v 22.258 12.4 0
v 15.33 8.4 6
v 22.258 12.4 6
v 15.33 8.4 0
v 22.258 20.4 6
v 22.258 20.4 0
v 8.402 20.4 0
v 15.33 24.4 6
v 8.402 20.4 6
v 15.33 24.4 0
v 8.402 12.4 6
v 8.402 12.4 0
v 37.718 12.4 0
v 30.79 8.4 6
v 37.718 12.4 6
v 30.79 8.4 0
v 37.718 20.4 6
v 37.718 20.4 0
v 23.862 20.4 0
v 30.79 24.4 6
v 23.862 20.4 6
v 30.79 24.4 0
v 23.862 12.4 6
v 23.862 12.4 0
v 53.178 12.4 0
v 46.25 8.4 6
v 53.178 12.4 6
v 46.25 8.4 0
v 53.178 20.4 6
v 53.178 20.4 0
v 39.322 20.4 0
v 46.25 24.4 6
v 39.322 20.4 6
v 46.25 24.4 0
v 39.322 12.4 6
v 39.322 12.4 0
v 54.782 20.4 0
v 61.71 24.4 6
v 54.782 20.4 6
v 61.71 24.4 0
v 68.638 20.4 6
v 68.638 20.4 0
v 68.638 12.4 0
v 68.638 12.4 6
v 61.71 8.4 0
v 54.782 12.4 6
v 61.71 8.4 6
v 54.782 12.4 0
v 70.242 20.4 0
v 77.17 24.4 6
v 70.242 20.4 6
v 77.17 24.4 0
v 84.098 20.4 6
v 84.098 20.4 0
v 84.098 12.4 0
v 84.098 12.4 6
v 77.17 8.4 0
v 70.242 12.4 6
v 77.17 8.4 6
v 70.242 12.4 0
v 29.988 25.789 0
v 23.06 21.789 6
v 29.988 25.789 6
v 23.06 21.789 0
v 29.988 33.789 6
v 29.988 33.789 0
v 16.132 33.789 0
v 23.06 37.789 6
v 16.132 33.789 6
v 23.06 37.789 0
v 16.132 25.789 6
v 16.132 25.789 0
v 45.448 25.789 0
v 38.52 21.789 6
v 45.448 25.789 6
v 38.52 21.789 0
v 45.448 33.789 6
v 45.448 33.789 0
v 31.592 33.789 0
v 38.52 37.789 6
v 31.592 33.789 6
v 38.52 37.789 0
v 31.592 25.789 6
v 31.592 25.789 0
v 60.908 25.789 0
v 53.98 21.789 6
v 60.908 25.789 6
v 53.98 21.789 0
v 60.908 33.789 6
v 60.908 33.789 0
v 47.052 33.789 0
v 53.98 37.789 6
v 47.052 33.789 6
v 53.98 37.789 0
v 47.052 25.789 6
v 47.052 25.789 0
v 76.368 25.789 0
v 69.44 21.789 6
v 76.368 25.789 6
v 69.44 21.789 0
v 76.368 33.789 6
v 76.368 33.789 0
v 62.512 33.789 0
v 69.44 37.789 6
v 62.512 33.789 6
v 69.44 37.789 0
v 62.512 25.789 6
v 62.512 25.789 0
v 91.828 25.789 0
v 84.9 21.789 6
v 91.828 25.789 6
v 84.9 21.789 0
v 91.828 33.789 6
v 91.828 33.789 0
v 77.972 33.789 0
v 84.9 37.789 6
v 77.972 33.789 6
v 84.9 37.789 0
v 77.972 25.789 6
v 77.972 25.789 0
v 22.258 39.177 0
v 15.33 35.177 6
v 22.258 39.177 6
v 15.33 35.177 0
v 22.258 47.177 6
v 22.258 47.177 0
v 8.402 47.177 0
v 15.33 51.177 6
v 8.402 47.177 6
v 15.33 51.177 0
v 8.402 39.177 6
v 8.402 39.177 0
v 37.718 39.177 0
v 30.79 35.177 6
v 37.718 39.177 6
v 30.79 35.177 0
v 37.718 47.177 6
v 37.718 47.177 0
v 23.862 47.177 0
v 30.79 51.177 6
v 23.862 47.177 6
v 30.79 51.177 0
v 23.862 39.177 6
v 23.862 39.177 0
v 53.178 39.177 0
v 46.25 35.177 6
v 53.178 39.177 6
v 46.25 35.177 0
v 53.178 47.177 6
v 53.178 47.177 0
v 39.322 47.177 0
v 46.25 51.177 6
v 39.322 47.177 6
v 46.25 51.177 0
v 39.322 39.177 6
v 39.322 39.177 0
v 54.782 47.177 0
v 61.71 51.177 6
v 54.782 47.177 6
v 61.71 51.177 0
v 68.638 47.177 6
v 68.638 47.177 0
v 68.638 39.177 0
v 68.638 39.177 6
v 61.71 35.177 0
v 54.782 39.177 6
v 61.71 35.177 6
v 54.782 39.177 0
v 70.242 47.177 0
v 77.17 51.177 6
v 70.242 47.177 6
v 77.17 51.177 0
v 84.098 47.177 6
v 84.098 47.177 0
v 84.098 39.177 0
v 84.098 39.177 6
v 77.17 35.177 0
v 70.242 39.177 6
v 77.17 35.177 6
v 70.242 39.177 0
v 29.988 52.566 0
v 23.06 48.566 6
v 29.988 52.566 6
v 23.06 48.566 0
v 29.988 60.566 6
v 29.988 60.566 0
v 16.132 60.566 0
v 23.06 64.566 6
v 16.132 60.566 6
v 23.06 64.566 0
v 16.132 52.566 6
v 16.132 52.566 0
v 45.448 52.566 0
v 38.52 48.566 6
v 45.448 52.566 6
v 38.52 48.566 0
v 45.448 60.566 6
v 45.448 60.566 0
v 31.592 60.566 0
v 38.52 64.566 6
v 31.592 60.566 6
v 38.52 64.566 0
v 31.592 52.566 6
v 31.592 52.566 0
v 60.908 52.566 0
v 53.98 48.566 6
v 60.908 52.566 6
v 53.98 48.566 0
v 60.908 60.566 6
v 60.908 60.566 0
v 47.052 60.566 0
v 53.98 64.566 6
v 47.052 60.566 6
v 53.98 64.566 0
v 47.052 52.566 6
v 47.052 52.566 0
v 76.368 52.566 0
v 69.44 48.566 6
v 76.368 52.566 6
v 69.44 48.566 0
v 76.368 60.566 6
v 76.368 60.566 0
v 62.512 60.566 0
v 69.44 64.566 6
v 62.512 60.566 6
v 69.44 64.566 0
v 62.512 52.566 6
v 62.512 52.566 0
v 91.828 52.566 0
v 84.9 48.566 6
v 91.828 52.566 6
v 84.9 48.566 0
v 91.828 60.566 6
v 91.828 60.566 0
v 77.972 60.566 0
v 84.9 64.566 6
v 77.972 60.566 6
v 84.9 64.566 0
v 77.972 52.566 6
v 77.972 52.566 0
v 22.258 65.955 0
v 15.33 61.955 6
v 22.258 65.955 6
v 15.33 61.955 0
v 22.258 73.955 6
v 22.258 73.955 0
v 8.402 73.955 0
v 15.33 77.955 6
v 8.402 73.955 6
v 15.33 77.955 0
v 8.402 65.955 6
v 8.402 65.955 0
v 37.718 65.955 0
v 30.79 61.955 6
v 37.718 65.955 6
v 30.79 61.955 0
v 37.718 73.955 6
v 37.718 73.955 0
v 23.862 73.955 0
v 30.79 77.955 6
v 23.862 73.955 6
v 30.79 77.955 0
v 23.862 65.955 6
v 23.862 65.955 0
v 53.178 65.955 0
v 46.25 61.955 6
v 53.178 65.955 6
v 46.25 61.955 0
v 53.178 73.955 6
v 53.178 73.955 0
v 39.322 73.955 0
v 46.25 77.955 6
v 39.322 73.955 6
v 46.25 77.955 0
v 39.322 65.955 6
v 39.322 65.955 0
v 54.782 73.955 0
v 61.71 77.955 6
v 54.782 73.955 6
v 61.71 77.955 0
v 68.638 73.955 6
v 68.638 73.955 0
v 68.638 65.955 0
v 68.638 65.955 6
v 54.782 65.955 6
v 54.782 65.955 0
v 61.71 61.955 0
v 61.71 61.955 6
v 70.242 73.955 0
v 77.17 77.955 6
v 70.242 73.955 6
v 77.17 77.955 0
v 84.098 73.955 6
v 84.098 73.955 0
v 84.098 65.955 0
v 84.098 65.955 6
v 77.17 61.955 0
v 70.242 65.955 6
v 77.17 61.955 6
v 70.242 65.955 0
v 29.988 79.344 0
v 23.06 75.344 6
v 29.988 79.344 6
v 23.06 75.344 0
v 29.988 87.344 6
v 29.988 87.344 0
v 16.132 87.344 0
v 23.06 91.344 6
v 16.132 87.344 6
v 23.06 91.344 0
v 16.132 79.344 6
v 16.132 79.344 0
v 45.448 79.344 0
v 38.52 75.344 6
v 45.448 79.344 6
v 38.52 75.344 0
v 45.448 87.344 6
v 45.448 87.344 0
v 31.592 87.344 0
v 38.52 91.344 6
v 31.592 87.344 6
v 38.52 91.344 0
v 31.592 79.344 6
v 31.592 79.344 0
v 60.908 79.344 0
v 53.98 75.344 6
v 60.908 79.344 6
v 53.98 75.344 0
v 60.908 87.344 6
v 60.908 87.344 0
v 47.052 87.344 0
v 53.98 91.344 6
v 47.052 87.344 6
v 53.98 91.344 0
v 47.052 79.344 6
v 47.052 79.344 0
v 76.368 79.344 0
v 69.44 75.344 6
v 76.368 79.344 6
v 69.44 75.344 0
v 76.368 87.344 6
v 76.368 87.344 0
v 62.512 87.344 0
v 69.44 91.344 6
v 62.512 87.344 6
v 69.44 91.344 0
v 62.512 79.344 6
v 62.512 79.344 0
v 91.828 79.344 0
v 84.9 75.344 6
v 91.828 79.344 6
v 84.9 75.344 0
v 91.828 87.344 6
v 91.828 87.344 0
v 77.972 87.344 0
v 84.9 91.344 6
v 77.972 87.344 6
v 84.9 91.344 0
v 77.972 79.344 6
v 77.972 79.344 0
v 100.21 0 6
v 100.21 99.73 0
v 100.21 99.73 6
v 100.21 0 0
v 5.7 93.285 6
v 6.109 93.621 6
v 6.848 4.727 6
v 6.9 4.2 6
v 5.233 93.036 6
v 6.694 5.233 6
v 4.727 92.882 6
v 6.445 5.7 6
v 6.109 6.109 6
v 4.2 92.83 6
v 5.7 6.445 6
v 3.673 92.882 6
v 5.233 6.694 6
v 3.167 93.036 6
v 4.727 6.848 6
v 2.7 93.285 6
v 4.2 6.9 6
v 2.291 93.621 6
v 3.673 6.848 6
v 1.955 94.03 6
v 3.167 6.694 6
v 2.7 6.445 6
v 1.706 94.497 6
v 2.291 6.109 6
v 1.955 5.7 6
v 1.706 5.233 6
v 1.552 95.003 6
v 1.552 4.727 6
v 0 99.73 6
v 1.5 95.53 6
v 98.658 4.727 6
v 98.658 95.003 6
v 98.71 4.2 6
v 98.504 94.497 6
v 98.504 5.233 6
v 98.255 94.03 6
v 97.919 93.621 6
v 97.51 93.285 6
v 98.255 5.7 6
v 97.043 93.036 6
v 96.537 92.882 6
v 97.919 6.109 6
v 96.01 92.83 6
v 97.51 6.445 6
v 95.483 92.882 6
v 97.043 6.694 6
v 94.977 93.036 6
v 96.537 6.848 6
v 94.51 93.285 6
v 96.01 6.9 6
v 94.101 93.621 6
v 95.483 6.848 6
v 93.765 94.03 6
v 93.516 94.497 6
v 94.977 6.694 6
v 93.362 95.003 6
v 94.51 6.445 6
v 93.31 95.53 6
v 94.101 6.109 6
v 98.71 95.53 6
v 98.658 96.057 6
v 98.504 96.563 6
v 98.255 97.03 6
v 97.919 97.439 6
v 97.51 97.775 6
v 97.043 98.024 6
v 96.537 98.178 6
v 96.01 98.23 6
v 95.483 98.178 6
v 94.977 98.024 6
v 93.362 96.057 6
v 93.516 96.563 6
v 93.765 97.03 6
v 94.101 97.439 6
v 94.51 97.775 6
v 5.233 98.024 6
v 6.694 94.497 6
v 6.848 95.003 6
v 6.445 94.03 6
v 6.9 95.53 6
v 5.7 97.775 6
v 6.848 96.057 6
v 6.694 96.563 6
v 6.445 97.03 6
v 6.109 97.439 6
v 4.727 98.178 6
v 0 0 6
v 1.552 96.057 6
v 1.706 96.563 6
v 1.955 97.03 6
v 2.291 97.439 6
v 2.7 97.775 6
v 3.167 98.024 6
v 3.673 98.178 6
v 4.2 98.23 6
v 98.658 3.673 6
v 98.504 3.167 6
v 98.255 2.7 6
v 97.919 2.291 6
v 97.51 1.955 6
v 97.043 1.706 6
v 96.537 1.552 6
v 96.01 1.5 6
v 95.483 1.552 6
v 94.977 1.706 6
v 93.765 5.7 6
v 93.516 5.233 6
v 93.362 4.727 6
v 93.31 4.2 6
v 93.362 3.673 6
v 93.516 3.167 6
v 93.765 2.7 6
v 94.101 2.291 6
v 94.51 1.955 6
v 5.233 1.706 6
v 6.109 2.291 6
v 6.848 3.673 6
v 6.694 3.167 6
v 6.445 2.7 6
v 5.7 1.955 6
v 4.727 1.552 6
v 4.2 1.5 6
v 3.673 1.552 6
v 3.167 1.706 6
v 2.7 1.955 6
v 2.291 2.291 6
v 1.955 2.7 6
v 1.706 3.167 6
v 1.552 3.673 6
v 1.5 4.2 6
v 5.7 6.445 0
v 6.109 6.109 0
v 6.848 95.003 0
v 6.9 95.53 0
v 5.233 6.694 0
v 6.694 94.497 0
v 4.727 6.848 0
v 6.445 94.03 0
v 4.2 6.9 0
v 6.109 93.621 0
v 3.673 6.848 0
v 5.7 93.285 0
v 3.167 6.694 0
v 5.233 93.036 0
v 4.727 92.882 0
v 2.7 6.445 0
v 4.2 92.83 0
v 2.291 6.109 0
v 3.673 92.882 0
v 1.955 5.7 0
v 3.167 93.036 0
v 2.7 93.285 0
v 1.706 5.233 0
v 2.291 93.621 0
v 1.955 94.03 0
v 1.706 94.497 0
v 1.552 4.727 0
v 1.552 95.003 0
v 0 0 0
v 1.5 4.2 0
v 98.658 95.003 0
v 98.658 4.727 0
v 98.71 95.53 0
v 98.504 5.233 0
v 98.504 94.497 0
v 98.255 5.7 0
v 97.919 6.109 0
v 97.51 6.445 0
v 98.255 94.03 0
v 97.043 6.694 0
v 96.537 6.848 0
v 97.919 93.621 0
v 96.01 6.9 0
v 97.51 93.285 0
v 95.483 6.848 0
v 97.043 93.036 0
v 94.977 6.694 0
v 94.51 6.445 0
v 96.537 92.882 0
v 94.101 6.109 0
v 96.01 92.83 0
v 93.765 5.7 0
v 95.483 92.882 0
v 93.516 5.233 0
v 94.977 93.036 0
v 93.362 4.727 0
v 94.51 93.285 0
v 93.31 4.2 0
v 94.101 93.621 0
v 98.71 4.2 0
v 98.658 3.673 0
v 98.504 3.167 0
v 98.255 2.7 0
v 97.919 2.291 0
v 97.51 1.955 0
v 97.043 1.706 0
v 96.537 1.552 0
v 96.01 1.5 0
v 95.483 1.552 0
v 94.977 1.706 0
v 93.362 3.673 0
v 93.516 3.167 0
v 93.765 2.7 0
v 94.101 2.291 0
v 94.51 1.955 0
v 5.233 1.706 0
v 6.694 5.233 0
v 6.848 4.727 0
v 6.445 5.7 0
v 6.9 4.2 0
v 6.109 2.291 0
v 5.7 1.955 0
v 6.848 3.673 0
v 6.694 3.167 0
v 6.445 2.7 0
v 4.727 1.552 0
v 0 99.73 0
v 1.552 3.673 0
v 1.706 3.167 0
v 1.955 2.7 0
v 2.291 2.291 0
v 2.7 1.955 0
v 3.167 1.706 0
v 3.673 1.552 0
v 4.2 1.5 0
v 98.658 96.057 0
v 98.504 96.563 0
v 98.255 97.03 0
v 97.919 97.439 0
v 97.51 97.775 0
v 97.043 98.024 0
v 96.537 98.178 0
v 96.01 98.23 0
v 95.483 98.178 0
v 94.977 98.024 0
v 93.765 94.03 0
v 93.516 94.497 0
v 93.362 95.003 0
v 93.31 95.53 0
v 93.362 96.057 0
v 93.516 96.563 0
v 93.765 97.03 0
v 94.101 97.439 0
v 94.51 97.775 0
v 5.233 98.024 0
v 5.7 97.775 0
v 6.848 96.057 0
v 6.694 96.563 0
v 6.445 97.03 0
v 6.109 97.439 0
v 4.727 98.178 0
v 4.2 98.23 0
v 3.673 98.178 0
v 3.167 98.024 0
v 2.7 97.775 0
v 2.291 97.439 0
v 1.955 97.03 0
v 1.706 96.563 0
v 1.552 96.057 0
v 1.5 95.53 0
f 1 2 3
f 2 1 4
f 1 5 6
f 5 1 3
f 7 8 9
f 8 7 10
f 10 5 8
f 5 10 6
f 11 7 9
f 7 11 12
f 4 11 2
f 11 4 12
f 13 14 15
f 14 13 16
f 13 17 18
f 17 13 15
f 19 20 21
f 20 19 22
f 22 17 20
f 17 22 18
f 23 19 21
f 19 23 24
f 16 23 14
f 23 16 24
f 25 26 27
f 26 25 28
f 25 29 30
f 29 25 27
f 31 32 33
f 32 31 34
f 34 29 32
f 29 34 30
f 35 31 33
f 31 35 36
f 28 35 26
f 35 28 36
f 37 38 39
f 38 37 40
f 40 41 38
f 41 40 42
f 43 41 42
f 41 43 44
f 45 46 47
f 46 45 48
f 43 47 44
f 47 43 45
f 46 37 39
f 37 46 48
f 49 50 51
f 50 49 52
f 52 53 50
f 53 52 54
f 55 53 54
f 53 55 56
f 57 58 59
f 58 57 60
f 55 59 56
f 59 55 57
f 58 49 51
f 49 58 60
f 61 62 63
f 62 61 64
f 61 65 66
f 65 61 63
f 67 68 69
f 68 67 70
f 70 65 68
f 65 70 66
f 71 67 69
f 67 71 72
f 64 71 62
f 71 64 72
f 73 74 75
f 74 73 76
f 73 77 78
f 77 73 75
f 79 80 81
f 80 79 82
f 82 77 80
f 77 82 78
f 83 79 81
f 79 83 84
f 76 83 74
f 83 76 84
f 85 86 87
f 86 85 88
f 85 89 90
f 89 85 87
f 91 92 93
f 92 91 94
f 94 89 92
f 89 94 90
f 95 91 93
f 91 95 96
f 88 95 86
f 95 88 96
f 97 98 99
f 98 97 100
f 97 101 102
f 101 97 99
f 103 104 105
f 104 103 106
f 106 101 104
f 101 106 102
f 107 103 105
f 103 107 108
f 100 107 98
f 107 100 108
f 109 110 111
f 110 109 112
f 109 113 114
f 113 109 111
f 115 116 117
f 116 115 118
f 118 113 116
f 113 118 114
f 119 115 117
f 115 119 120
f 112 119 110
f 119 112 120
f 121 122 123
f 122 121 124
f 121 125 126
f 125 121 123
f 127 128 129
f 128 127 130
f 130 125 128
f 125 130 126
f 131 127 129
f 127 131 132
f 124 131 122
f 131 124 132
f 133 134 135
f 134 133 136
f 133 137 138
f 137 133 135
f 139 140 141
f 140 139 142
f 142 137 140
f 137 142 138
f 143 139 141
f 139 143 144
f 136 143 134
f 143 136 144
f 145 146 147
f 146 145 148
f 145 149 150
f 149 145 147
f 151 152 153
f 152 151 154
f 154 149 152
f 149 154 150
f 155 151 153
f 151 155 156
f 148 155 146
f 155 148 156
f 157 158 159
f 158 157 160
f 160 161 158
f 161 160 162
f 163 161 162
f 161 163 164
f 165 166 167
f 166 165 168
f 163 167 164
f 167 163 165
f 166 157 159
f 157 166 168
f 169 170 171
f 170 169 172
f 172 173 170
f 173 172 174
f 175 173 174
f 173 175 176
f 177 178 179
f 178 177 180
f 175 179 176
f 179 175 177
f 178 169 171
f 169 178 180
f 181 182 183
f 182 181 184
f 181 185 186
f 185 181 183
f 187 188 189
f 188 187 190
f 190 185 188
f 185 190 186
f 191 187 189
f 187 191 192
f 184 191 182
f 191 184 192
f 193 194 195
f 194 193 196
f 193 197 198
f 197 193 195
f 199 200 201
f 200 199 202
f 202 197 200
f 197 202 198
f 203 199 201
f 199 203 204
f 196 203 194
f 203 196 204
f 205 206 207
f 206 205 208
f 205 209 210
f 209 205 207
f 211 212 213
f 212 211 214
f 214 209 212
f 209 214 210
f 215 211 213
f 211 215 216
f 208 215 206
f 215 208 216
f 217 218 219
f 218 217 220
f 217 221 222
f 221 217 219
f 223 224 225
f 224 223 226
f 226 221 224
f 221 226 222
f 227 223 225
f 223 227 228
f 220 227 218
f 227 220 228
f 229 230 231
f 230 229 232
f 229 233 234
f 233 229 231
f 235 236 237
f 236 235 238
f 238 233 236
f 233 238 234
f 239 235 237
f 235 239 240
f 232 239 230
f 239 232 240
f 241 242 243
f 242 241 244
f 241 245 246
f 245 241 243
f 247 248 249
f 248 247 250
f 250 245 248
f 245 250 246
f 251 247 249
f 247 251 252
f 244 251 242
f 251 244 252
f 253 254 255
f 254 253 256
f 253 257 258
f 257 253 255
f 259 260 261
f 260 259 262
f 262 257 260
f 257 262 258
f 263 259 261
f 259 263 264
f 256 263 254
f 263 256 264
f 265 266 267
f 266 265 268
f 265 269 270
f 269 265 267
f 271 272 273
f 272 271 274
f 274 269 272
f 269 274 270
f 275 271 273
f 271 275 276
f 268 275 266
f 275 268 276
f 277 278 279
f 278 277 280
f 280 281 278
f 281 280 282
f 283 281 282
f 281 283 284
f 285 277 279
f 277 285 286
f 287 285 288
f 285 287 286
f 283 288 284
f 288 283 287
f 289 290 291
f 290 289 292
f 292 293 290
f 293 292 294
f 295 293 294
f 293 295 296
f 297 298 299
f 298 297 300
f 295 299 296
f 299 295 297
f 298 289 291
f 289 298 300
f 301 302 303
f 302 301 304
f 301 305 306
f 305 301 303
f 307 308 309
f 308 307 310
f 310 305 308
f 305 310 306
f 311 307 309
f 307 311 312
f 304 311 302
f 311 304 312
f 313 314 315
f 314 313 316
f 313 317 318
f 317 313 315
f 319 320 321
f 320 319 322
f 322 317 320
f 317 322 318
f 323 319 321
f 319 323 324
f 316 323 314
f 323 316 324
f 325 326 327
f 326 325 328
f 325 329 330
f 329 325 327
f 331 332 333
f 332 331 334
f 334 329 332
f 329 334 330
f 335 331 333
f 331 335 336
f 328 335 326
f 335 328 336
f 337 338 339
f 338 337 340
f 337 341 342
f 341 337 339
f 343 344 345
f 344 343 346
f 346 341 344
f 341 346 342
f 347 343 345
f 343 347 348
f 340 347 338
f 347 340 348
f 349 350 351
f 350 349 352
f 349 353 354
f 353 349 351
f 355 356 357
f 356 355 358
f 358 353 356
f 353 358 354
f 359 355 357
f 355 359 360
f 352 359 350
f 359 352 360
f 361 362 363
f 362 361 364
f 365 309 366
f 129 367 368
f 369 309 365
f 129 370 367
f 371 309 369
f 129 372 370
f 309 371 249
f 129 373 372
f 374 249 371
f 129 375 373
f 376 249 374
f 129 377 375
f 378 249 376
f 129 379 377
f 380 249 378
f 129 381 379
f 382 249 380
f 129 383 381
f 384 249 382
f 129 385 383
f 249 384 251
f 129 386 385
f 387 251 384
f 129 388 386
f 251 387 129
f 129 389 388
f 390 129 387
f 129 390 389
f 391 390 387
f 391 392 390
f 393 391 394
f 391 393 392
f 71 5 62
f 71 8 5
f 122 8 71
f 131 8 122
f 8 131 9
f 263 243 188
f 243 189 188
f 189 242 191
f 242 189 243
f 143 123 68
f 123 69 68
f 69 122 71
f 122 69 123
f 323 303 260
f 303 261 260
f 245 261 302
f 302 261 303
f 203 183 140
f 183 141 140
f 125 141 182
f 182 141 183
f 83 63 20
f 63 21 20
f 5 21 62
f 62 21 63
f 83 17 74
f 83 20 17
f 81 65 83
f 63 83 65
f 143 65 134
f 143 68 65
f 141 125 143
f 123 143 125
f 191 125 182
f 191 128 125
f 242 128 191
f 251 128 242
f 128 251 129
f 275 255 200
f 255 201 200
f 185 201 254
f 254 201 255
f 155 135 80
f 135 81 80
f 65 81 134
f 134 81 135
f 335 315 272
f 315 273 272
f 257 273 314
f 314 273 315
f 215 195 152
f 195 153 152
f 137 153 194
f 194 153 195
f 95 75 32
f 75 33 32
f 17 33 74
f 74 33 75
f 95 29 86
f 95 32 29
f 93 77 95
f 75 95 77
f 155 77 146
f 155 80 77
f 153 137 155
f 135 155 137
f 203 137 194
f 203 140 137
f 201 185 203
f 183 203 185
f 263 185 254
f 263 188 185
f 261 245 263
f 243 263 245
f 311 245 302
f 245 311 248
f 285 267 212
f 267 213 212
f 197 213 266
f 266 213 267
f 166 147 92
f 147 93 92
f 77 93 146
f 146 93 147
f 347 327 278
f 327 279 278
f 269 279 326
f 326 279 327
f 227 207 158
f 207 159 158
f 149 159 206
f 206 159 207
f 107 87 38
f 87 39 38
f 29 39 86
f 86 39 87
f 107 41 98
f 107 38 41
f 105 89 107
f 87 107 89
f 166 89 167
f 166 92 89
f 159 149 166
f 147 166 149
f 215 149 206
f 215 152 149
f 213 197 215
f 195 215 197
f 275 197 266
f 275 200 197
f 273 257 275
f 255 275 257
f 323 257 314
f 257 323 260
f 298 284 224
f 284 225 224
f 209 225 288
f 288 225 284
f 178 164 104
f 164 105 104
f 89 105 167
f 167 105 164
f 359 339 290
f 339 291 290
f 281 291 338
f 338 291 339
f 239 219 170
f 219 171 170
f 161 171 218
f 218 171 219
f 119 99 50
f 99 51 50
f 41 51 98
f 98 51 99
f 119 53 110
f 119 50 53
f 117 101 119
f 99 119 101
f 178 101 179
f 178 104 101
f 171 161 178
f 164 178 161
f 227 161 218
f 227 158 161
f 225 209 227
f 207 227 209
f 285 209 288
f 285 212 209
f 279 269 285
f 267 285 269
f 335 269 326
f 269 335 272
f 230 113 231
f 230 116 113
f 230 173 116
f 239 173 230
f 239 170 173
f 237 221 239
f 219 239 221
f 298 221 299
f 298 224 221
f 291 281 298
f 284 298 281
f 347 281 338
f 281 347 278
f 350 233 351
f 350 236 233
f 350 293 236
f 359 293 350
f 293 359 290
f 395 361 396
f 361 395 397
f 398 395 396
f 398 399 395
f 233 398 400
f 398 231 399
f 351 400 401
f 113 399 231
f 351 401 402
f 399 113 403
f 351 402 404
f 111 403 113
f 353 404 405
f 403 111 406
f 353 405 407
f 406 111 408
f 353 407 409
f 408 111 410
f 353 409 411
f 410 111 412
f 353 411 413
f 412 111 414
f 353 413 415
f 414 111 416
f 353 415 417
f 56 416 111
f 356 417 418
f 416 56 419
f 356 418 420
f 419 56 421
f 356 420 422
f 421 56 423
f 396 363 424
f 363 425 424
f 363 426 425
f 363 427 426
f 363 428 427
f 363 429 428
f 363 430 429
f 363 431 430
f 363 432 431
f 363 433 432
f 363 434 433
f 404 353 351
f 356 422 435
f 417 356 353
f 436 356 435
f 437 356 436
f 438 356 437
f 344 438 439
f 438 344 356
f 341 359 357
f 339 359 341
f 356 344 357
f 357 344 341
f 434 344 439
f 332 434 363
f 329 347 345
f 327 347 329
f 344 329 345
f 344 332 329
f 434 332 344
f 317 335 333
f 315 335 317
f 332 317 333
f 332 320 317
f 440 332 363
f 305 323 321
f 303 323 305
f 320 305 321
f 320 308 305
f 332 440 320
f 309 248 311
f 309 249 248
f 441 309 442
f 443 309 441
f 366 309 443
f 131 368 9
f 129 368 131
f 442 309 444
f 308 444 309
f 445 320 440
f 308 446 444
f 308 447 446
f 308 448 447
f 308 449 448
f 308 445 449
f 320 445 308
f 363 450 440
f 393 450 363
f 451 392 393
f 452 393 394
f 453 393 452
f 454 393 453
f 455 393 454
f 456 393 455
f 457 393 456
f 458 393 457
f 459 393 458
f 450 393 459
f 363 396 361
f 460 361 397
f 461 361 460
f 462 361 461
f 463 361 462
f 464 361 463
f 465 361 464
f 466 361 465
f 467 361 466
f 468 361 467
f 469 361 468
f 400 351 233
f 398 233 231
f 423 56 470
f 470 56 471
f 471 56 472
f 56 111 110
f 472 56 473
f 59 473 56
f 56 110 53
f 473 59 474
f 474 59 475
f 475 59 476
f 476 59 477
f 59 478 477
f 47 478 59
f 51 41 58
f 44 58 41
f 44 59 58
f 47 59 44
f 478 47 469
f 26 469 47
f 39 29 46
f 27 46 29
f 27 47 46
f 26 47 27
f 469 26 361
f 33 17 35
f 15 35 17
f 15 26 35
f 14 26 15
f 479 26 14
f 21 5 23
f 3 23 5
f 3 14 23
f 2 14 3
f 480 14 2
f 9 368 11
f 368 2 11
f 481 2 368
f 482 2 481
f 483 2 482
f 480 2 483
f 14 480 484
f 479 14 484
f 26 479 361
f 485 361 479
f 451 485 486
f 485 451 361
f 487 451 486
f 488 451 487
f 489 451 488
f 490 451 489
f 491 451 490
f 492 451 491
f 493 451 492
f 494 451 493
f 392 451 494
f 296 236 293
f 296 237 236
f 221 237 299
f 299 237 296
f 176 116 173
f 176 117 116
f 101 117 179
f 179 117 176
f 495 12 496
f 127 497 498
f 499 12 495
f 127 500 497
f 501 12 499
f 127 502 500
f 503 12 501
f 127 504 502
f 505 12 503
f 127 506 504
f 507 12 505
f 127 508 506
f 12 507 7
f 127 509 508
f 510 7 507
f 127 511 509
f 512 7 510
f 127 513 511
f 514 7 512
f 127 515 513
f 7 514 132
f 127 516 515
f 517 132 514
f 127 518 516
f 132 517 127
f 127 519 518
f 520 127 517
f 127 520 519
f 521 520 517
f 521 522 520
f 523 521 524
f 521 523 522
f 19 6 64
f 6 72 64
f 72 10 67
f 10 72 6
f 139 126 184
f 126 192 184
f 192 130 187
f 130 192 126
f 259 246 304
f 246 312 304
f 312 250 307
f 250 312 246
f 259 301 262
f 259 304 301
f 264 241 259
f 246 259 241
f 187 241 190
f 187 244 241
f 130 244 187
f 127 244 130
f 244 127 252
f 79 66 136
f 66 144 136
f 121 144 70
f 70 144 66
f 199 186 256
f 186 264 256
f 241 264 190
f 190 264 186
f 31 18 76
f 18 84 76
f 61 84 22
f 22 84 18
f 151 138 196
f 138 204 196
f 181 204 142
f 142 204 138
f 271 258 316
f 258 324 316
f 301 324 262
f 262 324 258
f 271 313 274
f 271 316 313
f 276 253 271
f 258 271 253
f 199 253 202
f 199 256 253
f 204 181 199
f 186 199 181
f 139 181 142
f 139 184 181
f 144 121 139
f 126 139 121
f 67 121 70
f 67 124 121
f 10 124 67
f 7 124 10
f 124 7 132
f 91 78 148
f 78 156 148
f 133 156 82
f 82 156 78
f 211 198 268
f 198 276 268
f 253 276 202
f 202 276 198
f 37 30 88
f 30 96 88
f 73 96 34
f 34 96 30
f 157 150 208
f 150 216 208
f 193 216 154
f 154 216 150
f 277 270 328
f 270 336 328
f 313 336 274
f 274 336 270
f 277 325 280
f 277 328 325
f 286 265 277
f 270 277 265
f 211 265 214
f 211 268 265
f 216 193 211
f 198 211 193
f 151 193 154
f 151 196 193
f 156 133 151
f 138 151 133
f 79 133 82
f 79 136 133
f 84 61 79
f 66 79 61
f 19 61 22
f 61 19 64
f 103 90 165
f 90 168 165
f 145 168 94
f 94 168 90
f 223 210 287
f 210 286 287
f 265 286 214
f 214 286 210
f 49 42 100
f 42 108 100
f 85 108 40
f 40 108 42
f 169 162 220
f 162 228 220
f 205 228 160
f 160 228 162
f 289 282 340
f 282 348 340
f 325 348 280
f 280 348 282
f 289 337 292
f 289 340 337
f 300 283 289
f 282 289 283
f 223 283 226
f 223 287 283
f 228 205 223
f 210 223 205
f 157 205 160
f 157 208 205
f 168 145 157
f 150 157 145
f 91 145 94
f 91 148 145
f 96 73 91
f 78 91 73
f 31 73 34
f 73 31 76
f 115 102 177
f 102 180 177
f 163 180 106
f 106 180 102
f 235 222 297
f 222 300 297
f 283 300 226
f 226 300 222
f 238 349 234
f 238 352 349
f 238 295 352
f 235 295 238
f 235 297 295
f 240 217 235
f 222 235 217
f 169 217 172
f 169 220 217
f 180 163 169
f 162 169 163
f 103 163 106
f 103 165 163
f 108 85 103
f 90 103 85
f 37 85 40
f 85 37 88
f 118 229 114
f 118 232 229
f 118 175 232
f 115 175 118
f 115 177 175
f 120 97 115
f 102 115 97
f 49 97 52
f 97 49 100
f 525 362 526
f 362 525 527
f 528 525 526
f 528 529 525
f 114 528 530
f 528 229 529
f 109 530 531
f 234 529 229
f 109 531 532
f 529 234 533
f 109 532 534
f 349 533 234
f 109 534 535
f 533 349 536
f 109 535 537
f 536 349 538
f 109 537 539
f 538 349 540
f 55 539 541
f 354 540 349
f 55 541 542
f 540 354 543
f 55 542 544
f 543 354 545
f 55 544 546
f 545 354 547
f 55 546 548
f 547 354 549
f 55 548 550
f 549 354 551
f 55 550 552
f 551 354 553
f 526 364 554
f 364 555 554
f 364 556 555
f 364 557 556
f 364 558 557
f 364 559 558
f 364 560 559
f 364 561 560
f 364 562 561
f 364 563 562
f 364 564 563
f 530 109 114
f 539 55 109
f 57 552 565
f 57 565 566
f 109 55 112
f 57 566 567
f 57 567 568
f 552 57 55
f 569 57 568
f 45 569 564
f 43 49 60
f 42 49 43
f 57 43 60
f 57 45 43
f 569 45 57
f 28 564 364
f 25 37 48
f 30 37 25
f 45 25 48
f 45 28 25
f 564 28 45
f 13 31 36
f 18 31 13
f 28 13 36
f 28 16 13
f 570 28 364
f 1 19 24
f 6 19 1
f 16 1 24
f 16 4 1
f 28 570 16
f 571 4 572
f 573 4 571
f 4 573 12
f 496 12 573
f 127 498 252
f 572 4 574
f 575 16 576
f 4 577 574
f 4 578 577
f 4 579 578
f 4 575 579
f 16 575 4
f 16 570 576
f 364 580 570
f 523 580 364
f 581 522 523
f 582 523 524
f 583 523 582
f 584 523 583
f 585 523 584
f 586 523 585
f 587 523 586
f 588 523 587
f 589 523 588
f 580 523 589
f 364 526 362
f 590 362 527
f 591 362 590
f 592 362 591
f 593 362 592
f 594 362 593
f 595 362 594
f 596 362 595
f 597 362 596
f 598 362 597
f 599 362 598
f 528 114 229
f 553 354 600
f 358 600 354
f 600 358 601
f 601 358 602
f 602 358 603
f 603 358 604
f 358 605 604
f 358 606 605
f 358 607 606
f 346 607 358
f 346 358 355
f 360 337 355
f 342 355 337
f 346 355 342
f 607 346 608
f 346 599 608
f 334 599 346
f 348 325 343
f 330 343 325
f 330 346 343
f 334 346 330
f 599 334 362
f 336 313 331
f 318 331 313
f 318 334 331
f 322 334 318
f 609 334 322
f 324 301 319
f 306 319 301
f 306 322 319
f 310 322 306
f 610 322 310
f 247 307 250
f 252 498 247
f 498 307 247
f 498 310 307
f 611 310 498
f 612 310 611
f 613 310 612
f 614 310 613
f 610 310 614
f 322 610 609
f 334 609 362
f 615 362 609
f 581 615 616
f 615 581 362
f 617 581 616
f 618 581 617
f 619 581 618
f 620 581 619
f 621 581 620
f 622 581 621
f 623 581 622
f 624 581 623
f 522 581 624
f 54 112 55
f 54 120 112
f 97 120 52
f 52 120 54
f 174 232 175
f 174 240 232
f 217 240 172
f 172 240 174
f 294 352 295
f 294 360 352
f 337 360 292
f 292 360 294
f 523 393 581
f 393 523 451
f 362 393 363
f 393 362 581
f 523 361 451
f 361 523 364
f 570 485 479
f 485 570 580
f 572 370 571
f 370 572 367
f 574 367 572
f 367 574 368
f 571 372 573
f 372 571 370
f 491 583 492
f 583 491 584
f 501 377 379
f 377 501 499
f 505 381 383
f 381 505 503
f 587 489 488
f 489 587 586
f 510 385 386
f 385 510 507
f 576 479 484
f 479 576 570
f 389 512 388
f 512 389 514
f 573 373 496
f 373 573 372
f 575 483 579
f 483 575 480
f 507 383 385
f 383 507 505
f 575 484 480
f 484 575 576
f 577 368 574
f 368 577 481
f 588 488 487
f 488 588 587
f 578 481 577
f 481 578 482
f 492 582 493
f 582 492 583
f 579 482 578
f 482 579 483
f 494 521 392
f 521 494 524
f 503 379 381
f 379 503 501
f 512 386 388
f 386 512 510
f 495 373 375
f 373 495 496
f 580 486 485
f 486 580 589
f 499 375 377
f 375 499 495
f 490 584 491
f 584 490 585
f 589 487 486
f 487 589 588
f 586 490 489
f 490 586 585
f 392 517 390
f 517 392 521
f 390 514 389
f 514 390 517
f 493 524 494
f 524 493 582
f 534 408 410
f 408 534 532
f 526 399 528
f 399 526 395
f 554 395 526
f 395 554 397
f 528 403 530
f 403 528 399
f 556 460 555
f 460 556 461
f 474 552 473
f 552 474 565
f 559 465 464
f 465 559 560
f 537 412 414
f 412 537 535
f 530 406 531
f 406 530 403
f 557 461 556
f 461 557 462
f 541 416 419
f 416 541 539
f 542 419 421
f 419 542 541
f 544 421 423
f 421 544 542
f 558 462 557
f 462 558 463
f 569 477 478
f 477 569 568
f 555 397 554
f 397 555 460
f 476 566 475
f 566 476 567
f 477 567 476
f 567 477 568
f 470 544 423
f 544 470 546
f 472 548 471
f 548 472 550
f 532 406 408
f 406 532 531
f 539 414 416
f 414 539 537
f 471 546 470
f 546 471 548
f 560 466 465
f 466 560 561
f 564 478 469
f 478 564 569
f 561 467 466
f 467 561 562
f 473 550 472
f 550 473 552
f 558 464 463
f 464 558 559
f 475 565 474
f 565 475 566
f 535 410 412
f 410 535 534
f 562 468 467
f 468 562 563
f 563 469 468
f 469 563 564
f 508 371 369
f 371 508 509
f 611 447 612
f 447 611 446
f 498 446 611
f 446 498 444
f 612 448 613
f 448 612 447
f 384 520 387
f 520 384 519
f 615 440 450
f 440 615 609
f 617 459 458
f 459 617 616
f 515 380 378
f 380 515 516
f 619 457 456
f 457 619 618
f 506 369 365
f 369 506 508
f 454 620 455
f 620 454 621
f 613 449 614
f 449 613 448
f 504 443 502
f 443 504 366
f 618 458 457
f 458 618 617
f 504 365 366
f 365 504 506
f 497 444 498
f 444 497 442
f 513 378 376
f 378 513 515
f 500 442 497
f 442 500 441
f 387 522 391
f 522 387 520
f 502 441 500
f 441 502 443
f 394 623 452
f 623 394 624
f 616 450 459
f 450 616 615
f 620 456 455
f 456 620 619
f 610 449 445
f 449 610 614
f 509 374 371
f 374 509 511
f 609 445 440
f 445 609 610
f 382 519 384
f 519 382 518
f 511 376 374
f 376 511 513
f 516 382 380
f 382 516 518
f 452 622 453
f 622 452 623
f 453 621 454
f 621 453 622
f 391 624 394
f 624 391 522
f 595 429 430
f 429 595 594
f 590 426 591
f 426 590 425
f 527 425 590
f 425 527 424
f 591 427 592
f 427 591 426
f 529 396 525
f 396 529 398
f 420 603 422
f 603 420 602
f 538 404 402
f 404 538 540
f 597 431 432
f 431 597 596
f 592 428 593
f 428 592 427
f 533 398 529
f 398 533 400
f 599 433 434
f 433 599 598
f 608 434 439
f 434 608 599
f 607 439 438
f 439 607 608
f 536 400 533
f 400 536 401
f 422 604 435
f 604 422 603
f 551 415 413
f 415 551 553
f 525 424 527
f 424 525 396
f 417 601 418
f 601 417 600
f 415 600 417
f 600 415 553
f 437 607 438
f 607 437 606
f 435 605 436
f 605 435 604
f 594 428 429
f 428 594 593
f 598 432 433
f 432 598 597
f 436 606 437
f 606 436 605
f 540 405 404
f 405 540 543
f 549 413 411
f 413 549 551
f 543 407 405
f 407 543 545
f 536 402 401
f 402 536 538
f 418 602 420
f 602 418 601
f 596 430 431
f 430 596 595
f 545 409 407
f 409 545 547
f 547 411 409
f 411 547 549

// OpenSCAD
$fn = 32;

// ----------------------------------------------------------------------
// Honeycomb panel: 100.21 x 99.73 mm, 30 cells of 16 mm
// ----------------------------------------------------------------------

// --- parameters (mm) ---
panel_w = 100.21;         // panel width
panel_d = 99.73;          // panel depth
thick = 6;                // panel thickness
cell_r = 8;               // hex cell circumradius
pitch = 15.46;            // hex cell pitch (centre to centre)
web = 1.6;                // web between the cells
columns = 5;              // columns of cells
rows = 6;                 // rows of cells
cell_count = 30;          // total cells
shift_x = 15.33;          // first cell offset in x
shift_y = 16.4;           // first cell offset in y
mount_d = 5.4;            // corner mounting holes
hole_off = 4.2;           // mounting hole offset from the corners

difference() {
  union() {
    cube([panel_w, panel_d, thick]);
  }
  /* hexagonal cells, point-up, cut right through the plate */
  for (row = [0 : rows - 1]) {
    for (col = [0 : columns - 1]) {
      translate([shift_x + col * pitch + (row % 2) * pitch / 2, shift_y + row * pitch * 0.866025, -2.5]) rotate([0, 0, 30]) cylinder(h = thick + 5, d = 2 * cell_r, $fn = 6);
    }
  }
  /* corner mounting holes, clear of the outer cell web */
  translate([4.2, 4.2, -2.5]) cylinder(h = thick + 5, d = mount_d);
  translate([96.01, 4.2, -2.5]) cylinder(h = thick + 5, d = mount_d);
  translate([4.2, 95.53, -2.5]) cylinder(h = thick + 5, d = mount_d);
  translate([96.01, 95.53, -2.5]) cylinder(h = thick + 5, d = mount_d);
}
